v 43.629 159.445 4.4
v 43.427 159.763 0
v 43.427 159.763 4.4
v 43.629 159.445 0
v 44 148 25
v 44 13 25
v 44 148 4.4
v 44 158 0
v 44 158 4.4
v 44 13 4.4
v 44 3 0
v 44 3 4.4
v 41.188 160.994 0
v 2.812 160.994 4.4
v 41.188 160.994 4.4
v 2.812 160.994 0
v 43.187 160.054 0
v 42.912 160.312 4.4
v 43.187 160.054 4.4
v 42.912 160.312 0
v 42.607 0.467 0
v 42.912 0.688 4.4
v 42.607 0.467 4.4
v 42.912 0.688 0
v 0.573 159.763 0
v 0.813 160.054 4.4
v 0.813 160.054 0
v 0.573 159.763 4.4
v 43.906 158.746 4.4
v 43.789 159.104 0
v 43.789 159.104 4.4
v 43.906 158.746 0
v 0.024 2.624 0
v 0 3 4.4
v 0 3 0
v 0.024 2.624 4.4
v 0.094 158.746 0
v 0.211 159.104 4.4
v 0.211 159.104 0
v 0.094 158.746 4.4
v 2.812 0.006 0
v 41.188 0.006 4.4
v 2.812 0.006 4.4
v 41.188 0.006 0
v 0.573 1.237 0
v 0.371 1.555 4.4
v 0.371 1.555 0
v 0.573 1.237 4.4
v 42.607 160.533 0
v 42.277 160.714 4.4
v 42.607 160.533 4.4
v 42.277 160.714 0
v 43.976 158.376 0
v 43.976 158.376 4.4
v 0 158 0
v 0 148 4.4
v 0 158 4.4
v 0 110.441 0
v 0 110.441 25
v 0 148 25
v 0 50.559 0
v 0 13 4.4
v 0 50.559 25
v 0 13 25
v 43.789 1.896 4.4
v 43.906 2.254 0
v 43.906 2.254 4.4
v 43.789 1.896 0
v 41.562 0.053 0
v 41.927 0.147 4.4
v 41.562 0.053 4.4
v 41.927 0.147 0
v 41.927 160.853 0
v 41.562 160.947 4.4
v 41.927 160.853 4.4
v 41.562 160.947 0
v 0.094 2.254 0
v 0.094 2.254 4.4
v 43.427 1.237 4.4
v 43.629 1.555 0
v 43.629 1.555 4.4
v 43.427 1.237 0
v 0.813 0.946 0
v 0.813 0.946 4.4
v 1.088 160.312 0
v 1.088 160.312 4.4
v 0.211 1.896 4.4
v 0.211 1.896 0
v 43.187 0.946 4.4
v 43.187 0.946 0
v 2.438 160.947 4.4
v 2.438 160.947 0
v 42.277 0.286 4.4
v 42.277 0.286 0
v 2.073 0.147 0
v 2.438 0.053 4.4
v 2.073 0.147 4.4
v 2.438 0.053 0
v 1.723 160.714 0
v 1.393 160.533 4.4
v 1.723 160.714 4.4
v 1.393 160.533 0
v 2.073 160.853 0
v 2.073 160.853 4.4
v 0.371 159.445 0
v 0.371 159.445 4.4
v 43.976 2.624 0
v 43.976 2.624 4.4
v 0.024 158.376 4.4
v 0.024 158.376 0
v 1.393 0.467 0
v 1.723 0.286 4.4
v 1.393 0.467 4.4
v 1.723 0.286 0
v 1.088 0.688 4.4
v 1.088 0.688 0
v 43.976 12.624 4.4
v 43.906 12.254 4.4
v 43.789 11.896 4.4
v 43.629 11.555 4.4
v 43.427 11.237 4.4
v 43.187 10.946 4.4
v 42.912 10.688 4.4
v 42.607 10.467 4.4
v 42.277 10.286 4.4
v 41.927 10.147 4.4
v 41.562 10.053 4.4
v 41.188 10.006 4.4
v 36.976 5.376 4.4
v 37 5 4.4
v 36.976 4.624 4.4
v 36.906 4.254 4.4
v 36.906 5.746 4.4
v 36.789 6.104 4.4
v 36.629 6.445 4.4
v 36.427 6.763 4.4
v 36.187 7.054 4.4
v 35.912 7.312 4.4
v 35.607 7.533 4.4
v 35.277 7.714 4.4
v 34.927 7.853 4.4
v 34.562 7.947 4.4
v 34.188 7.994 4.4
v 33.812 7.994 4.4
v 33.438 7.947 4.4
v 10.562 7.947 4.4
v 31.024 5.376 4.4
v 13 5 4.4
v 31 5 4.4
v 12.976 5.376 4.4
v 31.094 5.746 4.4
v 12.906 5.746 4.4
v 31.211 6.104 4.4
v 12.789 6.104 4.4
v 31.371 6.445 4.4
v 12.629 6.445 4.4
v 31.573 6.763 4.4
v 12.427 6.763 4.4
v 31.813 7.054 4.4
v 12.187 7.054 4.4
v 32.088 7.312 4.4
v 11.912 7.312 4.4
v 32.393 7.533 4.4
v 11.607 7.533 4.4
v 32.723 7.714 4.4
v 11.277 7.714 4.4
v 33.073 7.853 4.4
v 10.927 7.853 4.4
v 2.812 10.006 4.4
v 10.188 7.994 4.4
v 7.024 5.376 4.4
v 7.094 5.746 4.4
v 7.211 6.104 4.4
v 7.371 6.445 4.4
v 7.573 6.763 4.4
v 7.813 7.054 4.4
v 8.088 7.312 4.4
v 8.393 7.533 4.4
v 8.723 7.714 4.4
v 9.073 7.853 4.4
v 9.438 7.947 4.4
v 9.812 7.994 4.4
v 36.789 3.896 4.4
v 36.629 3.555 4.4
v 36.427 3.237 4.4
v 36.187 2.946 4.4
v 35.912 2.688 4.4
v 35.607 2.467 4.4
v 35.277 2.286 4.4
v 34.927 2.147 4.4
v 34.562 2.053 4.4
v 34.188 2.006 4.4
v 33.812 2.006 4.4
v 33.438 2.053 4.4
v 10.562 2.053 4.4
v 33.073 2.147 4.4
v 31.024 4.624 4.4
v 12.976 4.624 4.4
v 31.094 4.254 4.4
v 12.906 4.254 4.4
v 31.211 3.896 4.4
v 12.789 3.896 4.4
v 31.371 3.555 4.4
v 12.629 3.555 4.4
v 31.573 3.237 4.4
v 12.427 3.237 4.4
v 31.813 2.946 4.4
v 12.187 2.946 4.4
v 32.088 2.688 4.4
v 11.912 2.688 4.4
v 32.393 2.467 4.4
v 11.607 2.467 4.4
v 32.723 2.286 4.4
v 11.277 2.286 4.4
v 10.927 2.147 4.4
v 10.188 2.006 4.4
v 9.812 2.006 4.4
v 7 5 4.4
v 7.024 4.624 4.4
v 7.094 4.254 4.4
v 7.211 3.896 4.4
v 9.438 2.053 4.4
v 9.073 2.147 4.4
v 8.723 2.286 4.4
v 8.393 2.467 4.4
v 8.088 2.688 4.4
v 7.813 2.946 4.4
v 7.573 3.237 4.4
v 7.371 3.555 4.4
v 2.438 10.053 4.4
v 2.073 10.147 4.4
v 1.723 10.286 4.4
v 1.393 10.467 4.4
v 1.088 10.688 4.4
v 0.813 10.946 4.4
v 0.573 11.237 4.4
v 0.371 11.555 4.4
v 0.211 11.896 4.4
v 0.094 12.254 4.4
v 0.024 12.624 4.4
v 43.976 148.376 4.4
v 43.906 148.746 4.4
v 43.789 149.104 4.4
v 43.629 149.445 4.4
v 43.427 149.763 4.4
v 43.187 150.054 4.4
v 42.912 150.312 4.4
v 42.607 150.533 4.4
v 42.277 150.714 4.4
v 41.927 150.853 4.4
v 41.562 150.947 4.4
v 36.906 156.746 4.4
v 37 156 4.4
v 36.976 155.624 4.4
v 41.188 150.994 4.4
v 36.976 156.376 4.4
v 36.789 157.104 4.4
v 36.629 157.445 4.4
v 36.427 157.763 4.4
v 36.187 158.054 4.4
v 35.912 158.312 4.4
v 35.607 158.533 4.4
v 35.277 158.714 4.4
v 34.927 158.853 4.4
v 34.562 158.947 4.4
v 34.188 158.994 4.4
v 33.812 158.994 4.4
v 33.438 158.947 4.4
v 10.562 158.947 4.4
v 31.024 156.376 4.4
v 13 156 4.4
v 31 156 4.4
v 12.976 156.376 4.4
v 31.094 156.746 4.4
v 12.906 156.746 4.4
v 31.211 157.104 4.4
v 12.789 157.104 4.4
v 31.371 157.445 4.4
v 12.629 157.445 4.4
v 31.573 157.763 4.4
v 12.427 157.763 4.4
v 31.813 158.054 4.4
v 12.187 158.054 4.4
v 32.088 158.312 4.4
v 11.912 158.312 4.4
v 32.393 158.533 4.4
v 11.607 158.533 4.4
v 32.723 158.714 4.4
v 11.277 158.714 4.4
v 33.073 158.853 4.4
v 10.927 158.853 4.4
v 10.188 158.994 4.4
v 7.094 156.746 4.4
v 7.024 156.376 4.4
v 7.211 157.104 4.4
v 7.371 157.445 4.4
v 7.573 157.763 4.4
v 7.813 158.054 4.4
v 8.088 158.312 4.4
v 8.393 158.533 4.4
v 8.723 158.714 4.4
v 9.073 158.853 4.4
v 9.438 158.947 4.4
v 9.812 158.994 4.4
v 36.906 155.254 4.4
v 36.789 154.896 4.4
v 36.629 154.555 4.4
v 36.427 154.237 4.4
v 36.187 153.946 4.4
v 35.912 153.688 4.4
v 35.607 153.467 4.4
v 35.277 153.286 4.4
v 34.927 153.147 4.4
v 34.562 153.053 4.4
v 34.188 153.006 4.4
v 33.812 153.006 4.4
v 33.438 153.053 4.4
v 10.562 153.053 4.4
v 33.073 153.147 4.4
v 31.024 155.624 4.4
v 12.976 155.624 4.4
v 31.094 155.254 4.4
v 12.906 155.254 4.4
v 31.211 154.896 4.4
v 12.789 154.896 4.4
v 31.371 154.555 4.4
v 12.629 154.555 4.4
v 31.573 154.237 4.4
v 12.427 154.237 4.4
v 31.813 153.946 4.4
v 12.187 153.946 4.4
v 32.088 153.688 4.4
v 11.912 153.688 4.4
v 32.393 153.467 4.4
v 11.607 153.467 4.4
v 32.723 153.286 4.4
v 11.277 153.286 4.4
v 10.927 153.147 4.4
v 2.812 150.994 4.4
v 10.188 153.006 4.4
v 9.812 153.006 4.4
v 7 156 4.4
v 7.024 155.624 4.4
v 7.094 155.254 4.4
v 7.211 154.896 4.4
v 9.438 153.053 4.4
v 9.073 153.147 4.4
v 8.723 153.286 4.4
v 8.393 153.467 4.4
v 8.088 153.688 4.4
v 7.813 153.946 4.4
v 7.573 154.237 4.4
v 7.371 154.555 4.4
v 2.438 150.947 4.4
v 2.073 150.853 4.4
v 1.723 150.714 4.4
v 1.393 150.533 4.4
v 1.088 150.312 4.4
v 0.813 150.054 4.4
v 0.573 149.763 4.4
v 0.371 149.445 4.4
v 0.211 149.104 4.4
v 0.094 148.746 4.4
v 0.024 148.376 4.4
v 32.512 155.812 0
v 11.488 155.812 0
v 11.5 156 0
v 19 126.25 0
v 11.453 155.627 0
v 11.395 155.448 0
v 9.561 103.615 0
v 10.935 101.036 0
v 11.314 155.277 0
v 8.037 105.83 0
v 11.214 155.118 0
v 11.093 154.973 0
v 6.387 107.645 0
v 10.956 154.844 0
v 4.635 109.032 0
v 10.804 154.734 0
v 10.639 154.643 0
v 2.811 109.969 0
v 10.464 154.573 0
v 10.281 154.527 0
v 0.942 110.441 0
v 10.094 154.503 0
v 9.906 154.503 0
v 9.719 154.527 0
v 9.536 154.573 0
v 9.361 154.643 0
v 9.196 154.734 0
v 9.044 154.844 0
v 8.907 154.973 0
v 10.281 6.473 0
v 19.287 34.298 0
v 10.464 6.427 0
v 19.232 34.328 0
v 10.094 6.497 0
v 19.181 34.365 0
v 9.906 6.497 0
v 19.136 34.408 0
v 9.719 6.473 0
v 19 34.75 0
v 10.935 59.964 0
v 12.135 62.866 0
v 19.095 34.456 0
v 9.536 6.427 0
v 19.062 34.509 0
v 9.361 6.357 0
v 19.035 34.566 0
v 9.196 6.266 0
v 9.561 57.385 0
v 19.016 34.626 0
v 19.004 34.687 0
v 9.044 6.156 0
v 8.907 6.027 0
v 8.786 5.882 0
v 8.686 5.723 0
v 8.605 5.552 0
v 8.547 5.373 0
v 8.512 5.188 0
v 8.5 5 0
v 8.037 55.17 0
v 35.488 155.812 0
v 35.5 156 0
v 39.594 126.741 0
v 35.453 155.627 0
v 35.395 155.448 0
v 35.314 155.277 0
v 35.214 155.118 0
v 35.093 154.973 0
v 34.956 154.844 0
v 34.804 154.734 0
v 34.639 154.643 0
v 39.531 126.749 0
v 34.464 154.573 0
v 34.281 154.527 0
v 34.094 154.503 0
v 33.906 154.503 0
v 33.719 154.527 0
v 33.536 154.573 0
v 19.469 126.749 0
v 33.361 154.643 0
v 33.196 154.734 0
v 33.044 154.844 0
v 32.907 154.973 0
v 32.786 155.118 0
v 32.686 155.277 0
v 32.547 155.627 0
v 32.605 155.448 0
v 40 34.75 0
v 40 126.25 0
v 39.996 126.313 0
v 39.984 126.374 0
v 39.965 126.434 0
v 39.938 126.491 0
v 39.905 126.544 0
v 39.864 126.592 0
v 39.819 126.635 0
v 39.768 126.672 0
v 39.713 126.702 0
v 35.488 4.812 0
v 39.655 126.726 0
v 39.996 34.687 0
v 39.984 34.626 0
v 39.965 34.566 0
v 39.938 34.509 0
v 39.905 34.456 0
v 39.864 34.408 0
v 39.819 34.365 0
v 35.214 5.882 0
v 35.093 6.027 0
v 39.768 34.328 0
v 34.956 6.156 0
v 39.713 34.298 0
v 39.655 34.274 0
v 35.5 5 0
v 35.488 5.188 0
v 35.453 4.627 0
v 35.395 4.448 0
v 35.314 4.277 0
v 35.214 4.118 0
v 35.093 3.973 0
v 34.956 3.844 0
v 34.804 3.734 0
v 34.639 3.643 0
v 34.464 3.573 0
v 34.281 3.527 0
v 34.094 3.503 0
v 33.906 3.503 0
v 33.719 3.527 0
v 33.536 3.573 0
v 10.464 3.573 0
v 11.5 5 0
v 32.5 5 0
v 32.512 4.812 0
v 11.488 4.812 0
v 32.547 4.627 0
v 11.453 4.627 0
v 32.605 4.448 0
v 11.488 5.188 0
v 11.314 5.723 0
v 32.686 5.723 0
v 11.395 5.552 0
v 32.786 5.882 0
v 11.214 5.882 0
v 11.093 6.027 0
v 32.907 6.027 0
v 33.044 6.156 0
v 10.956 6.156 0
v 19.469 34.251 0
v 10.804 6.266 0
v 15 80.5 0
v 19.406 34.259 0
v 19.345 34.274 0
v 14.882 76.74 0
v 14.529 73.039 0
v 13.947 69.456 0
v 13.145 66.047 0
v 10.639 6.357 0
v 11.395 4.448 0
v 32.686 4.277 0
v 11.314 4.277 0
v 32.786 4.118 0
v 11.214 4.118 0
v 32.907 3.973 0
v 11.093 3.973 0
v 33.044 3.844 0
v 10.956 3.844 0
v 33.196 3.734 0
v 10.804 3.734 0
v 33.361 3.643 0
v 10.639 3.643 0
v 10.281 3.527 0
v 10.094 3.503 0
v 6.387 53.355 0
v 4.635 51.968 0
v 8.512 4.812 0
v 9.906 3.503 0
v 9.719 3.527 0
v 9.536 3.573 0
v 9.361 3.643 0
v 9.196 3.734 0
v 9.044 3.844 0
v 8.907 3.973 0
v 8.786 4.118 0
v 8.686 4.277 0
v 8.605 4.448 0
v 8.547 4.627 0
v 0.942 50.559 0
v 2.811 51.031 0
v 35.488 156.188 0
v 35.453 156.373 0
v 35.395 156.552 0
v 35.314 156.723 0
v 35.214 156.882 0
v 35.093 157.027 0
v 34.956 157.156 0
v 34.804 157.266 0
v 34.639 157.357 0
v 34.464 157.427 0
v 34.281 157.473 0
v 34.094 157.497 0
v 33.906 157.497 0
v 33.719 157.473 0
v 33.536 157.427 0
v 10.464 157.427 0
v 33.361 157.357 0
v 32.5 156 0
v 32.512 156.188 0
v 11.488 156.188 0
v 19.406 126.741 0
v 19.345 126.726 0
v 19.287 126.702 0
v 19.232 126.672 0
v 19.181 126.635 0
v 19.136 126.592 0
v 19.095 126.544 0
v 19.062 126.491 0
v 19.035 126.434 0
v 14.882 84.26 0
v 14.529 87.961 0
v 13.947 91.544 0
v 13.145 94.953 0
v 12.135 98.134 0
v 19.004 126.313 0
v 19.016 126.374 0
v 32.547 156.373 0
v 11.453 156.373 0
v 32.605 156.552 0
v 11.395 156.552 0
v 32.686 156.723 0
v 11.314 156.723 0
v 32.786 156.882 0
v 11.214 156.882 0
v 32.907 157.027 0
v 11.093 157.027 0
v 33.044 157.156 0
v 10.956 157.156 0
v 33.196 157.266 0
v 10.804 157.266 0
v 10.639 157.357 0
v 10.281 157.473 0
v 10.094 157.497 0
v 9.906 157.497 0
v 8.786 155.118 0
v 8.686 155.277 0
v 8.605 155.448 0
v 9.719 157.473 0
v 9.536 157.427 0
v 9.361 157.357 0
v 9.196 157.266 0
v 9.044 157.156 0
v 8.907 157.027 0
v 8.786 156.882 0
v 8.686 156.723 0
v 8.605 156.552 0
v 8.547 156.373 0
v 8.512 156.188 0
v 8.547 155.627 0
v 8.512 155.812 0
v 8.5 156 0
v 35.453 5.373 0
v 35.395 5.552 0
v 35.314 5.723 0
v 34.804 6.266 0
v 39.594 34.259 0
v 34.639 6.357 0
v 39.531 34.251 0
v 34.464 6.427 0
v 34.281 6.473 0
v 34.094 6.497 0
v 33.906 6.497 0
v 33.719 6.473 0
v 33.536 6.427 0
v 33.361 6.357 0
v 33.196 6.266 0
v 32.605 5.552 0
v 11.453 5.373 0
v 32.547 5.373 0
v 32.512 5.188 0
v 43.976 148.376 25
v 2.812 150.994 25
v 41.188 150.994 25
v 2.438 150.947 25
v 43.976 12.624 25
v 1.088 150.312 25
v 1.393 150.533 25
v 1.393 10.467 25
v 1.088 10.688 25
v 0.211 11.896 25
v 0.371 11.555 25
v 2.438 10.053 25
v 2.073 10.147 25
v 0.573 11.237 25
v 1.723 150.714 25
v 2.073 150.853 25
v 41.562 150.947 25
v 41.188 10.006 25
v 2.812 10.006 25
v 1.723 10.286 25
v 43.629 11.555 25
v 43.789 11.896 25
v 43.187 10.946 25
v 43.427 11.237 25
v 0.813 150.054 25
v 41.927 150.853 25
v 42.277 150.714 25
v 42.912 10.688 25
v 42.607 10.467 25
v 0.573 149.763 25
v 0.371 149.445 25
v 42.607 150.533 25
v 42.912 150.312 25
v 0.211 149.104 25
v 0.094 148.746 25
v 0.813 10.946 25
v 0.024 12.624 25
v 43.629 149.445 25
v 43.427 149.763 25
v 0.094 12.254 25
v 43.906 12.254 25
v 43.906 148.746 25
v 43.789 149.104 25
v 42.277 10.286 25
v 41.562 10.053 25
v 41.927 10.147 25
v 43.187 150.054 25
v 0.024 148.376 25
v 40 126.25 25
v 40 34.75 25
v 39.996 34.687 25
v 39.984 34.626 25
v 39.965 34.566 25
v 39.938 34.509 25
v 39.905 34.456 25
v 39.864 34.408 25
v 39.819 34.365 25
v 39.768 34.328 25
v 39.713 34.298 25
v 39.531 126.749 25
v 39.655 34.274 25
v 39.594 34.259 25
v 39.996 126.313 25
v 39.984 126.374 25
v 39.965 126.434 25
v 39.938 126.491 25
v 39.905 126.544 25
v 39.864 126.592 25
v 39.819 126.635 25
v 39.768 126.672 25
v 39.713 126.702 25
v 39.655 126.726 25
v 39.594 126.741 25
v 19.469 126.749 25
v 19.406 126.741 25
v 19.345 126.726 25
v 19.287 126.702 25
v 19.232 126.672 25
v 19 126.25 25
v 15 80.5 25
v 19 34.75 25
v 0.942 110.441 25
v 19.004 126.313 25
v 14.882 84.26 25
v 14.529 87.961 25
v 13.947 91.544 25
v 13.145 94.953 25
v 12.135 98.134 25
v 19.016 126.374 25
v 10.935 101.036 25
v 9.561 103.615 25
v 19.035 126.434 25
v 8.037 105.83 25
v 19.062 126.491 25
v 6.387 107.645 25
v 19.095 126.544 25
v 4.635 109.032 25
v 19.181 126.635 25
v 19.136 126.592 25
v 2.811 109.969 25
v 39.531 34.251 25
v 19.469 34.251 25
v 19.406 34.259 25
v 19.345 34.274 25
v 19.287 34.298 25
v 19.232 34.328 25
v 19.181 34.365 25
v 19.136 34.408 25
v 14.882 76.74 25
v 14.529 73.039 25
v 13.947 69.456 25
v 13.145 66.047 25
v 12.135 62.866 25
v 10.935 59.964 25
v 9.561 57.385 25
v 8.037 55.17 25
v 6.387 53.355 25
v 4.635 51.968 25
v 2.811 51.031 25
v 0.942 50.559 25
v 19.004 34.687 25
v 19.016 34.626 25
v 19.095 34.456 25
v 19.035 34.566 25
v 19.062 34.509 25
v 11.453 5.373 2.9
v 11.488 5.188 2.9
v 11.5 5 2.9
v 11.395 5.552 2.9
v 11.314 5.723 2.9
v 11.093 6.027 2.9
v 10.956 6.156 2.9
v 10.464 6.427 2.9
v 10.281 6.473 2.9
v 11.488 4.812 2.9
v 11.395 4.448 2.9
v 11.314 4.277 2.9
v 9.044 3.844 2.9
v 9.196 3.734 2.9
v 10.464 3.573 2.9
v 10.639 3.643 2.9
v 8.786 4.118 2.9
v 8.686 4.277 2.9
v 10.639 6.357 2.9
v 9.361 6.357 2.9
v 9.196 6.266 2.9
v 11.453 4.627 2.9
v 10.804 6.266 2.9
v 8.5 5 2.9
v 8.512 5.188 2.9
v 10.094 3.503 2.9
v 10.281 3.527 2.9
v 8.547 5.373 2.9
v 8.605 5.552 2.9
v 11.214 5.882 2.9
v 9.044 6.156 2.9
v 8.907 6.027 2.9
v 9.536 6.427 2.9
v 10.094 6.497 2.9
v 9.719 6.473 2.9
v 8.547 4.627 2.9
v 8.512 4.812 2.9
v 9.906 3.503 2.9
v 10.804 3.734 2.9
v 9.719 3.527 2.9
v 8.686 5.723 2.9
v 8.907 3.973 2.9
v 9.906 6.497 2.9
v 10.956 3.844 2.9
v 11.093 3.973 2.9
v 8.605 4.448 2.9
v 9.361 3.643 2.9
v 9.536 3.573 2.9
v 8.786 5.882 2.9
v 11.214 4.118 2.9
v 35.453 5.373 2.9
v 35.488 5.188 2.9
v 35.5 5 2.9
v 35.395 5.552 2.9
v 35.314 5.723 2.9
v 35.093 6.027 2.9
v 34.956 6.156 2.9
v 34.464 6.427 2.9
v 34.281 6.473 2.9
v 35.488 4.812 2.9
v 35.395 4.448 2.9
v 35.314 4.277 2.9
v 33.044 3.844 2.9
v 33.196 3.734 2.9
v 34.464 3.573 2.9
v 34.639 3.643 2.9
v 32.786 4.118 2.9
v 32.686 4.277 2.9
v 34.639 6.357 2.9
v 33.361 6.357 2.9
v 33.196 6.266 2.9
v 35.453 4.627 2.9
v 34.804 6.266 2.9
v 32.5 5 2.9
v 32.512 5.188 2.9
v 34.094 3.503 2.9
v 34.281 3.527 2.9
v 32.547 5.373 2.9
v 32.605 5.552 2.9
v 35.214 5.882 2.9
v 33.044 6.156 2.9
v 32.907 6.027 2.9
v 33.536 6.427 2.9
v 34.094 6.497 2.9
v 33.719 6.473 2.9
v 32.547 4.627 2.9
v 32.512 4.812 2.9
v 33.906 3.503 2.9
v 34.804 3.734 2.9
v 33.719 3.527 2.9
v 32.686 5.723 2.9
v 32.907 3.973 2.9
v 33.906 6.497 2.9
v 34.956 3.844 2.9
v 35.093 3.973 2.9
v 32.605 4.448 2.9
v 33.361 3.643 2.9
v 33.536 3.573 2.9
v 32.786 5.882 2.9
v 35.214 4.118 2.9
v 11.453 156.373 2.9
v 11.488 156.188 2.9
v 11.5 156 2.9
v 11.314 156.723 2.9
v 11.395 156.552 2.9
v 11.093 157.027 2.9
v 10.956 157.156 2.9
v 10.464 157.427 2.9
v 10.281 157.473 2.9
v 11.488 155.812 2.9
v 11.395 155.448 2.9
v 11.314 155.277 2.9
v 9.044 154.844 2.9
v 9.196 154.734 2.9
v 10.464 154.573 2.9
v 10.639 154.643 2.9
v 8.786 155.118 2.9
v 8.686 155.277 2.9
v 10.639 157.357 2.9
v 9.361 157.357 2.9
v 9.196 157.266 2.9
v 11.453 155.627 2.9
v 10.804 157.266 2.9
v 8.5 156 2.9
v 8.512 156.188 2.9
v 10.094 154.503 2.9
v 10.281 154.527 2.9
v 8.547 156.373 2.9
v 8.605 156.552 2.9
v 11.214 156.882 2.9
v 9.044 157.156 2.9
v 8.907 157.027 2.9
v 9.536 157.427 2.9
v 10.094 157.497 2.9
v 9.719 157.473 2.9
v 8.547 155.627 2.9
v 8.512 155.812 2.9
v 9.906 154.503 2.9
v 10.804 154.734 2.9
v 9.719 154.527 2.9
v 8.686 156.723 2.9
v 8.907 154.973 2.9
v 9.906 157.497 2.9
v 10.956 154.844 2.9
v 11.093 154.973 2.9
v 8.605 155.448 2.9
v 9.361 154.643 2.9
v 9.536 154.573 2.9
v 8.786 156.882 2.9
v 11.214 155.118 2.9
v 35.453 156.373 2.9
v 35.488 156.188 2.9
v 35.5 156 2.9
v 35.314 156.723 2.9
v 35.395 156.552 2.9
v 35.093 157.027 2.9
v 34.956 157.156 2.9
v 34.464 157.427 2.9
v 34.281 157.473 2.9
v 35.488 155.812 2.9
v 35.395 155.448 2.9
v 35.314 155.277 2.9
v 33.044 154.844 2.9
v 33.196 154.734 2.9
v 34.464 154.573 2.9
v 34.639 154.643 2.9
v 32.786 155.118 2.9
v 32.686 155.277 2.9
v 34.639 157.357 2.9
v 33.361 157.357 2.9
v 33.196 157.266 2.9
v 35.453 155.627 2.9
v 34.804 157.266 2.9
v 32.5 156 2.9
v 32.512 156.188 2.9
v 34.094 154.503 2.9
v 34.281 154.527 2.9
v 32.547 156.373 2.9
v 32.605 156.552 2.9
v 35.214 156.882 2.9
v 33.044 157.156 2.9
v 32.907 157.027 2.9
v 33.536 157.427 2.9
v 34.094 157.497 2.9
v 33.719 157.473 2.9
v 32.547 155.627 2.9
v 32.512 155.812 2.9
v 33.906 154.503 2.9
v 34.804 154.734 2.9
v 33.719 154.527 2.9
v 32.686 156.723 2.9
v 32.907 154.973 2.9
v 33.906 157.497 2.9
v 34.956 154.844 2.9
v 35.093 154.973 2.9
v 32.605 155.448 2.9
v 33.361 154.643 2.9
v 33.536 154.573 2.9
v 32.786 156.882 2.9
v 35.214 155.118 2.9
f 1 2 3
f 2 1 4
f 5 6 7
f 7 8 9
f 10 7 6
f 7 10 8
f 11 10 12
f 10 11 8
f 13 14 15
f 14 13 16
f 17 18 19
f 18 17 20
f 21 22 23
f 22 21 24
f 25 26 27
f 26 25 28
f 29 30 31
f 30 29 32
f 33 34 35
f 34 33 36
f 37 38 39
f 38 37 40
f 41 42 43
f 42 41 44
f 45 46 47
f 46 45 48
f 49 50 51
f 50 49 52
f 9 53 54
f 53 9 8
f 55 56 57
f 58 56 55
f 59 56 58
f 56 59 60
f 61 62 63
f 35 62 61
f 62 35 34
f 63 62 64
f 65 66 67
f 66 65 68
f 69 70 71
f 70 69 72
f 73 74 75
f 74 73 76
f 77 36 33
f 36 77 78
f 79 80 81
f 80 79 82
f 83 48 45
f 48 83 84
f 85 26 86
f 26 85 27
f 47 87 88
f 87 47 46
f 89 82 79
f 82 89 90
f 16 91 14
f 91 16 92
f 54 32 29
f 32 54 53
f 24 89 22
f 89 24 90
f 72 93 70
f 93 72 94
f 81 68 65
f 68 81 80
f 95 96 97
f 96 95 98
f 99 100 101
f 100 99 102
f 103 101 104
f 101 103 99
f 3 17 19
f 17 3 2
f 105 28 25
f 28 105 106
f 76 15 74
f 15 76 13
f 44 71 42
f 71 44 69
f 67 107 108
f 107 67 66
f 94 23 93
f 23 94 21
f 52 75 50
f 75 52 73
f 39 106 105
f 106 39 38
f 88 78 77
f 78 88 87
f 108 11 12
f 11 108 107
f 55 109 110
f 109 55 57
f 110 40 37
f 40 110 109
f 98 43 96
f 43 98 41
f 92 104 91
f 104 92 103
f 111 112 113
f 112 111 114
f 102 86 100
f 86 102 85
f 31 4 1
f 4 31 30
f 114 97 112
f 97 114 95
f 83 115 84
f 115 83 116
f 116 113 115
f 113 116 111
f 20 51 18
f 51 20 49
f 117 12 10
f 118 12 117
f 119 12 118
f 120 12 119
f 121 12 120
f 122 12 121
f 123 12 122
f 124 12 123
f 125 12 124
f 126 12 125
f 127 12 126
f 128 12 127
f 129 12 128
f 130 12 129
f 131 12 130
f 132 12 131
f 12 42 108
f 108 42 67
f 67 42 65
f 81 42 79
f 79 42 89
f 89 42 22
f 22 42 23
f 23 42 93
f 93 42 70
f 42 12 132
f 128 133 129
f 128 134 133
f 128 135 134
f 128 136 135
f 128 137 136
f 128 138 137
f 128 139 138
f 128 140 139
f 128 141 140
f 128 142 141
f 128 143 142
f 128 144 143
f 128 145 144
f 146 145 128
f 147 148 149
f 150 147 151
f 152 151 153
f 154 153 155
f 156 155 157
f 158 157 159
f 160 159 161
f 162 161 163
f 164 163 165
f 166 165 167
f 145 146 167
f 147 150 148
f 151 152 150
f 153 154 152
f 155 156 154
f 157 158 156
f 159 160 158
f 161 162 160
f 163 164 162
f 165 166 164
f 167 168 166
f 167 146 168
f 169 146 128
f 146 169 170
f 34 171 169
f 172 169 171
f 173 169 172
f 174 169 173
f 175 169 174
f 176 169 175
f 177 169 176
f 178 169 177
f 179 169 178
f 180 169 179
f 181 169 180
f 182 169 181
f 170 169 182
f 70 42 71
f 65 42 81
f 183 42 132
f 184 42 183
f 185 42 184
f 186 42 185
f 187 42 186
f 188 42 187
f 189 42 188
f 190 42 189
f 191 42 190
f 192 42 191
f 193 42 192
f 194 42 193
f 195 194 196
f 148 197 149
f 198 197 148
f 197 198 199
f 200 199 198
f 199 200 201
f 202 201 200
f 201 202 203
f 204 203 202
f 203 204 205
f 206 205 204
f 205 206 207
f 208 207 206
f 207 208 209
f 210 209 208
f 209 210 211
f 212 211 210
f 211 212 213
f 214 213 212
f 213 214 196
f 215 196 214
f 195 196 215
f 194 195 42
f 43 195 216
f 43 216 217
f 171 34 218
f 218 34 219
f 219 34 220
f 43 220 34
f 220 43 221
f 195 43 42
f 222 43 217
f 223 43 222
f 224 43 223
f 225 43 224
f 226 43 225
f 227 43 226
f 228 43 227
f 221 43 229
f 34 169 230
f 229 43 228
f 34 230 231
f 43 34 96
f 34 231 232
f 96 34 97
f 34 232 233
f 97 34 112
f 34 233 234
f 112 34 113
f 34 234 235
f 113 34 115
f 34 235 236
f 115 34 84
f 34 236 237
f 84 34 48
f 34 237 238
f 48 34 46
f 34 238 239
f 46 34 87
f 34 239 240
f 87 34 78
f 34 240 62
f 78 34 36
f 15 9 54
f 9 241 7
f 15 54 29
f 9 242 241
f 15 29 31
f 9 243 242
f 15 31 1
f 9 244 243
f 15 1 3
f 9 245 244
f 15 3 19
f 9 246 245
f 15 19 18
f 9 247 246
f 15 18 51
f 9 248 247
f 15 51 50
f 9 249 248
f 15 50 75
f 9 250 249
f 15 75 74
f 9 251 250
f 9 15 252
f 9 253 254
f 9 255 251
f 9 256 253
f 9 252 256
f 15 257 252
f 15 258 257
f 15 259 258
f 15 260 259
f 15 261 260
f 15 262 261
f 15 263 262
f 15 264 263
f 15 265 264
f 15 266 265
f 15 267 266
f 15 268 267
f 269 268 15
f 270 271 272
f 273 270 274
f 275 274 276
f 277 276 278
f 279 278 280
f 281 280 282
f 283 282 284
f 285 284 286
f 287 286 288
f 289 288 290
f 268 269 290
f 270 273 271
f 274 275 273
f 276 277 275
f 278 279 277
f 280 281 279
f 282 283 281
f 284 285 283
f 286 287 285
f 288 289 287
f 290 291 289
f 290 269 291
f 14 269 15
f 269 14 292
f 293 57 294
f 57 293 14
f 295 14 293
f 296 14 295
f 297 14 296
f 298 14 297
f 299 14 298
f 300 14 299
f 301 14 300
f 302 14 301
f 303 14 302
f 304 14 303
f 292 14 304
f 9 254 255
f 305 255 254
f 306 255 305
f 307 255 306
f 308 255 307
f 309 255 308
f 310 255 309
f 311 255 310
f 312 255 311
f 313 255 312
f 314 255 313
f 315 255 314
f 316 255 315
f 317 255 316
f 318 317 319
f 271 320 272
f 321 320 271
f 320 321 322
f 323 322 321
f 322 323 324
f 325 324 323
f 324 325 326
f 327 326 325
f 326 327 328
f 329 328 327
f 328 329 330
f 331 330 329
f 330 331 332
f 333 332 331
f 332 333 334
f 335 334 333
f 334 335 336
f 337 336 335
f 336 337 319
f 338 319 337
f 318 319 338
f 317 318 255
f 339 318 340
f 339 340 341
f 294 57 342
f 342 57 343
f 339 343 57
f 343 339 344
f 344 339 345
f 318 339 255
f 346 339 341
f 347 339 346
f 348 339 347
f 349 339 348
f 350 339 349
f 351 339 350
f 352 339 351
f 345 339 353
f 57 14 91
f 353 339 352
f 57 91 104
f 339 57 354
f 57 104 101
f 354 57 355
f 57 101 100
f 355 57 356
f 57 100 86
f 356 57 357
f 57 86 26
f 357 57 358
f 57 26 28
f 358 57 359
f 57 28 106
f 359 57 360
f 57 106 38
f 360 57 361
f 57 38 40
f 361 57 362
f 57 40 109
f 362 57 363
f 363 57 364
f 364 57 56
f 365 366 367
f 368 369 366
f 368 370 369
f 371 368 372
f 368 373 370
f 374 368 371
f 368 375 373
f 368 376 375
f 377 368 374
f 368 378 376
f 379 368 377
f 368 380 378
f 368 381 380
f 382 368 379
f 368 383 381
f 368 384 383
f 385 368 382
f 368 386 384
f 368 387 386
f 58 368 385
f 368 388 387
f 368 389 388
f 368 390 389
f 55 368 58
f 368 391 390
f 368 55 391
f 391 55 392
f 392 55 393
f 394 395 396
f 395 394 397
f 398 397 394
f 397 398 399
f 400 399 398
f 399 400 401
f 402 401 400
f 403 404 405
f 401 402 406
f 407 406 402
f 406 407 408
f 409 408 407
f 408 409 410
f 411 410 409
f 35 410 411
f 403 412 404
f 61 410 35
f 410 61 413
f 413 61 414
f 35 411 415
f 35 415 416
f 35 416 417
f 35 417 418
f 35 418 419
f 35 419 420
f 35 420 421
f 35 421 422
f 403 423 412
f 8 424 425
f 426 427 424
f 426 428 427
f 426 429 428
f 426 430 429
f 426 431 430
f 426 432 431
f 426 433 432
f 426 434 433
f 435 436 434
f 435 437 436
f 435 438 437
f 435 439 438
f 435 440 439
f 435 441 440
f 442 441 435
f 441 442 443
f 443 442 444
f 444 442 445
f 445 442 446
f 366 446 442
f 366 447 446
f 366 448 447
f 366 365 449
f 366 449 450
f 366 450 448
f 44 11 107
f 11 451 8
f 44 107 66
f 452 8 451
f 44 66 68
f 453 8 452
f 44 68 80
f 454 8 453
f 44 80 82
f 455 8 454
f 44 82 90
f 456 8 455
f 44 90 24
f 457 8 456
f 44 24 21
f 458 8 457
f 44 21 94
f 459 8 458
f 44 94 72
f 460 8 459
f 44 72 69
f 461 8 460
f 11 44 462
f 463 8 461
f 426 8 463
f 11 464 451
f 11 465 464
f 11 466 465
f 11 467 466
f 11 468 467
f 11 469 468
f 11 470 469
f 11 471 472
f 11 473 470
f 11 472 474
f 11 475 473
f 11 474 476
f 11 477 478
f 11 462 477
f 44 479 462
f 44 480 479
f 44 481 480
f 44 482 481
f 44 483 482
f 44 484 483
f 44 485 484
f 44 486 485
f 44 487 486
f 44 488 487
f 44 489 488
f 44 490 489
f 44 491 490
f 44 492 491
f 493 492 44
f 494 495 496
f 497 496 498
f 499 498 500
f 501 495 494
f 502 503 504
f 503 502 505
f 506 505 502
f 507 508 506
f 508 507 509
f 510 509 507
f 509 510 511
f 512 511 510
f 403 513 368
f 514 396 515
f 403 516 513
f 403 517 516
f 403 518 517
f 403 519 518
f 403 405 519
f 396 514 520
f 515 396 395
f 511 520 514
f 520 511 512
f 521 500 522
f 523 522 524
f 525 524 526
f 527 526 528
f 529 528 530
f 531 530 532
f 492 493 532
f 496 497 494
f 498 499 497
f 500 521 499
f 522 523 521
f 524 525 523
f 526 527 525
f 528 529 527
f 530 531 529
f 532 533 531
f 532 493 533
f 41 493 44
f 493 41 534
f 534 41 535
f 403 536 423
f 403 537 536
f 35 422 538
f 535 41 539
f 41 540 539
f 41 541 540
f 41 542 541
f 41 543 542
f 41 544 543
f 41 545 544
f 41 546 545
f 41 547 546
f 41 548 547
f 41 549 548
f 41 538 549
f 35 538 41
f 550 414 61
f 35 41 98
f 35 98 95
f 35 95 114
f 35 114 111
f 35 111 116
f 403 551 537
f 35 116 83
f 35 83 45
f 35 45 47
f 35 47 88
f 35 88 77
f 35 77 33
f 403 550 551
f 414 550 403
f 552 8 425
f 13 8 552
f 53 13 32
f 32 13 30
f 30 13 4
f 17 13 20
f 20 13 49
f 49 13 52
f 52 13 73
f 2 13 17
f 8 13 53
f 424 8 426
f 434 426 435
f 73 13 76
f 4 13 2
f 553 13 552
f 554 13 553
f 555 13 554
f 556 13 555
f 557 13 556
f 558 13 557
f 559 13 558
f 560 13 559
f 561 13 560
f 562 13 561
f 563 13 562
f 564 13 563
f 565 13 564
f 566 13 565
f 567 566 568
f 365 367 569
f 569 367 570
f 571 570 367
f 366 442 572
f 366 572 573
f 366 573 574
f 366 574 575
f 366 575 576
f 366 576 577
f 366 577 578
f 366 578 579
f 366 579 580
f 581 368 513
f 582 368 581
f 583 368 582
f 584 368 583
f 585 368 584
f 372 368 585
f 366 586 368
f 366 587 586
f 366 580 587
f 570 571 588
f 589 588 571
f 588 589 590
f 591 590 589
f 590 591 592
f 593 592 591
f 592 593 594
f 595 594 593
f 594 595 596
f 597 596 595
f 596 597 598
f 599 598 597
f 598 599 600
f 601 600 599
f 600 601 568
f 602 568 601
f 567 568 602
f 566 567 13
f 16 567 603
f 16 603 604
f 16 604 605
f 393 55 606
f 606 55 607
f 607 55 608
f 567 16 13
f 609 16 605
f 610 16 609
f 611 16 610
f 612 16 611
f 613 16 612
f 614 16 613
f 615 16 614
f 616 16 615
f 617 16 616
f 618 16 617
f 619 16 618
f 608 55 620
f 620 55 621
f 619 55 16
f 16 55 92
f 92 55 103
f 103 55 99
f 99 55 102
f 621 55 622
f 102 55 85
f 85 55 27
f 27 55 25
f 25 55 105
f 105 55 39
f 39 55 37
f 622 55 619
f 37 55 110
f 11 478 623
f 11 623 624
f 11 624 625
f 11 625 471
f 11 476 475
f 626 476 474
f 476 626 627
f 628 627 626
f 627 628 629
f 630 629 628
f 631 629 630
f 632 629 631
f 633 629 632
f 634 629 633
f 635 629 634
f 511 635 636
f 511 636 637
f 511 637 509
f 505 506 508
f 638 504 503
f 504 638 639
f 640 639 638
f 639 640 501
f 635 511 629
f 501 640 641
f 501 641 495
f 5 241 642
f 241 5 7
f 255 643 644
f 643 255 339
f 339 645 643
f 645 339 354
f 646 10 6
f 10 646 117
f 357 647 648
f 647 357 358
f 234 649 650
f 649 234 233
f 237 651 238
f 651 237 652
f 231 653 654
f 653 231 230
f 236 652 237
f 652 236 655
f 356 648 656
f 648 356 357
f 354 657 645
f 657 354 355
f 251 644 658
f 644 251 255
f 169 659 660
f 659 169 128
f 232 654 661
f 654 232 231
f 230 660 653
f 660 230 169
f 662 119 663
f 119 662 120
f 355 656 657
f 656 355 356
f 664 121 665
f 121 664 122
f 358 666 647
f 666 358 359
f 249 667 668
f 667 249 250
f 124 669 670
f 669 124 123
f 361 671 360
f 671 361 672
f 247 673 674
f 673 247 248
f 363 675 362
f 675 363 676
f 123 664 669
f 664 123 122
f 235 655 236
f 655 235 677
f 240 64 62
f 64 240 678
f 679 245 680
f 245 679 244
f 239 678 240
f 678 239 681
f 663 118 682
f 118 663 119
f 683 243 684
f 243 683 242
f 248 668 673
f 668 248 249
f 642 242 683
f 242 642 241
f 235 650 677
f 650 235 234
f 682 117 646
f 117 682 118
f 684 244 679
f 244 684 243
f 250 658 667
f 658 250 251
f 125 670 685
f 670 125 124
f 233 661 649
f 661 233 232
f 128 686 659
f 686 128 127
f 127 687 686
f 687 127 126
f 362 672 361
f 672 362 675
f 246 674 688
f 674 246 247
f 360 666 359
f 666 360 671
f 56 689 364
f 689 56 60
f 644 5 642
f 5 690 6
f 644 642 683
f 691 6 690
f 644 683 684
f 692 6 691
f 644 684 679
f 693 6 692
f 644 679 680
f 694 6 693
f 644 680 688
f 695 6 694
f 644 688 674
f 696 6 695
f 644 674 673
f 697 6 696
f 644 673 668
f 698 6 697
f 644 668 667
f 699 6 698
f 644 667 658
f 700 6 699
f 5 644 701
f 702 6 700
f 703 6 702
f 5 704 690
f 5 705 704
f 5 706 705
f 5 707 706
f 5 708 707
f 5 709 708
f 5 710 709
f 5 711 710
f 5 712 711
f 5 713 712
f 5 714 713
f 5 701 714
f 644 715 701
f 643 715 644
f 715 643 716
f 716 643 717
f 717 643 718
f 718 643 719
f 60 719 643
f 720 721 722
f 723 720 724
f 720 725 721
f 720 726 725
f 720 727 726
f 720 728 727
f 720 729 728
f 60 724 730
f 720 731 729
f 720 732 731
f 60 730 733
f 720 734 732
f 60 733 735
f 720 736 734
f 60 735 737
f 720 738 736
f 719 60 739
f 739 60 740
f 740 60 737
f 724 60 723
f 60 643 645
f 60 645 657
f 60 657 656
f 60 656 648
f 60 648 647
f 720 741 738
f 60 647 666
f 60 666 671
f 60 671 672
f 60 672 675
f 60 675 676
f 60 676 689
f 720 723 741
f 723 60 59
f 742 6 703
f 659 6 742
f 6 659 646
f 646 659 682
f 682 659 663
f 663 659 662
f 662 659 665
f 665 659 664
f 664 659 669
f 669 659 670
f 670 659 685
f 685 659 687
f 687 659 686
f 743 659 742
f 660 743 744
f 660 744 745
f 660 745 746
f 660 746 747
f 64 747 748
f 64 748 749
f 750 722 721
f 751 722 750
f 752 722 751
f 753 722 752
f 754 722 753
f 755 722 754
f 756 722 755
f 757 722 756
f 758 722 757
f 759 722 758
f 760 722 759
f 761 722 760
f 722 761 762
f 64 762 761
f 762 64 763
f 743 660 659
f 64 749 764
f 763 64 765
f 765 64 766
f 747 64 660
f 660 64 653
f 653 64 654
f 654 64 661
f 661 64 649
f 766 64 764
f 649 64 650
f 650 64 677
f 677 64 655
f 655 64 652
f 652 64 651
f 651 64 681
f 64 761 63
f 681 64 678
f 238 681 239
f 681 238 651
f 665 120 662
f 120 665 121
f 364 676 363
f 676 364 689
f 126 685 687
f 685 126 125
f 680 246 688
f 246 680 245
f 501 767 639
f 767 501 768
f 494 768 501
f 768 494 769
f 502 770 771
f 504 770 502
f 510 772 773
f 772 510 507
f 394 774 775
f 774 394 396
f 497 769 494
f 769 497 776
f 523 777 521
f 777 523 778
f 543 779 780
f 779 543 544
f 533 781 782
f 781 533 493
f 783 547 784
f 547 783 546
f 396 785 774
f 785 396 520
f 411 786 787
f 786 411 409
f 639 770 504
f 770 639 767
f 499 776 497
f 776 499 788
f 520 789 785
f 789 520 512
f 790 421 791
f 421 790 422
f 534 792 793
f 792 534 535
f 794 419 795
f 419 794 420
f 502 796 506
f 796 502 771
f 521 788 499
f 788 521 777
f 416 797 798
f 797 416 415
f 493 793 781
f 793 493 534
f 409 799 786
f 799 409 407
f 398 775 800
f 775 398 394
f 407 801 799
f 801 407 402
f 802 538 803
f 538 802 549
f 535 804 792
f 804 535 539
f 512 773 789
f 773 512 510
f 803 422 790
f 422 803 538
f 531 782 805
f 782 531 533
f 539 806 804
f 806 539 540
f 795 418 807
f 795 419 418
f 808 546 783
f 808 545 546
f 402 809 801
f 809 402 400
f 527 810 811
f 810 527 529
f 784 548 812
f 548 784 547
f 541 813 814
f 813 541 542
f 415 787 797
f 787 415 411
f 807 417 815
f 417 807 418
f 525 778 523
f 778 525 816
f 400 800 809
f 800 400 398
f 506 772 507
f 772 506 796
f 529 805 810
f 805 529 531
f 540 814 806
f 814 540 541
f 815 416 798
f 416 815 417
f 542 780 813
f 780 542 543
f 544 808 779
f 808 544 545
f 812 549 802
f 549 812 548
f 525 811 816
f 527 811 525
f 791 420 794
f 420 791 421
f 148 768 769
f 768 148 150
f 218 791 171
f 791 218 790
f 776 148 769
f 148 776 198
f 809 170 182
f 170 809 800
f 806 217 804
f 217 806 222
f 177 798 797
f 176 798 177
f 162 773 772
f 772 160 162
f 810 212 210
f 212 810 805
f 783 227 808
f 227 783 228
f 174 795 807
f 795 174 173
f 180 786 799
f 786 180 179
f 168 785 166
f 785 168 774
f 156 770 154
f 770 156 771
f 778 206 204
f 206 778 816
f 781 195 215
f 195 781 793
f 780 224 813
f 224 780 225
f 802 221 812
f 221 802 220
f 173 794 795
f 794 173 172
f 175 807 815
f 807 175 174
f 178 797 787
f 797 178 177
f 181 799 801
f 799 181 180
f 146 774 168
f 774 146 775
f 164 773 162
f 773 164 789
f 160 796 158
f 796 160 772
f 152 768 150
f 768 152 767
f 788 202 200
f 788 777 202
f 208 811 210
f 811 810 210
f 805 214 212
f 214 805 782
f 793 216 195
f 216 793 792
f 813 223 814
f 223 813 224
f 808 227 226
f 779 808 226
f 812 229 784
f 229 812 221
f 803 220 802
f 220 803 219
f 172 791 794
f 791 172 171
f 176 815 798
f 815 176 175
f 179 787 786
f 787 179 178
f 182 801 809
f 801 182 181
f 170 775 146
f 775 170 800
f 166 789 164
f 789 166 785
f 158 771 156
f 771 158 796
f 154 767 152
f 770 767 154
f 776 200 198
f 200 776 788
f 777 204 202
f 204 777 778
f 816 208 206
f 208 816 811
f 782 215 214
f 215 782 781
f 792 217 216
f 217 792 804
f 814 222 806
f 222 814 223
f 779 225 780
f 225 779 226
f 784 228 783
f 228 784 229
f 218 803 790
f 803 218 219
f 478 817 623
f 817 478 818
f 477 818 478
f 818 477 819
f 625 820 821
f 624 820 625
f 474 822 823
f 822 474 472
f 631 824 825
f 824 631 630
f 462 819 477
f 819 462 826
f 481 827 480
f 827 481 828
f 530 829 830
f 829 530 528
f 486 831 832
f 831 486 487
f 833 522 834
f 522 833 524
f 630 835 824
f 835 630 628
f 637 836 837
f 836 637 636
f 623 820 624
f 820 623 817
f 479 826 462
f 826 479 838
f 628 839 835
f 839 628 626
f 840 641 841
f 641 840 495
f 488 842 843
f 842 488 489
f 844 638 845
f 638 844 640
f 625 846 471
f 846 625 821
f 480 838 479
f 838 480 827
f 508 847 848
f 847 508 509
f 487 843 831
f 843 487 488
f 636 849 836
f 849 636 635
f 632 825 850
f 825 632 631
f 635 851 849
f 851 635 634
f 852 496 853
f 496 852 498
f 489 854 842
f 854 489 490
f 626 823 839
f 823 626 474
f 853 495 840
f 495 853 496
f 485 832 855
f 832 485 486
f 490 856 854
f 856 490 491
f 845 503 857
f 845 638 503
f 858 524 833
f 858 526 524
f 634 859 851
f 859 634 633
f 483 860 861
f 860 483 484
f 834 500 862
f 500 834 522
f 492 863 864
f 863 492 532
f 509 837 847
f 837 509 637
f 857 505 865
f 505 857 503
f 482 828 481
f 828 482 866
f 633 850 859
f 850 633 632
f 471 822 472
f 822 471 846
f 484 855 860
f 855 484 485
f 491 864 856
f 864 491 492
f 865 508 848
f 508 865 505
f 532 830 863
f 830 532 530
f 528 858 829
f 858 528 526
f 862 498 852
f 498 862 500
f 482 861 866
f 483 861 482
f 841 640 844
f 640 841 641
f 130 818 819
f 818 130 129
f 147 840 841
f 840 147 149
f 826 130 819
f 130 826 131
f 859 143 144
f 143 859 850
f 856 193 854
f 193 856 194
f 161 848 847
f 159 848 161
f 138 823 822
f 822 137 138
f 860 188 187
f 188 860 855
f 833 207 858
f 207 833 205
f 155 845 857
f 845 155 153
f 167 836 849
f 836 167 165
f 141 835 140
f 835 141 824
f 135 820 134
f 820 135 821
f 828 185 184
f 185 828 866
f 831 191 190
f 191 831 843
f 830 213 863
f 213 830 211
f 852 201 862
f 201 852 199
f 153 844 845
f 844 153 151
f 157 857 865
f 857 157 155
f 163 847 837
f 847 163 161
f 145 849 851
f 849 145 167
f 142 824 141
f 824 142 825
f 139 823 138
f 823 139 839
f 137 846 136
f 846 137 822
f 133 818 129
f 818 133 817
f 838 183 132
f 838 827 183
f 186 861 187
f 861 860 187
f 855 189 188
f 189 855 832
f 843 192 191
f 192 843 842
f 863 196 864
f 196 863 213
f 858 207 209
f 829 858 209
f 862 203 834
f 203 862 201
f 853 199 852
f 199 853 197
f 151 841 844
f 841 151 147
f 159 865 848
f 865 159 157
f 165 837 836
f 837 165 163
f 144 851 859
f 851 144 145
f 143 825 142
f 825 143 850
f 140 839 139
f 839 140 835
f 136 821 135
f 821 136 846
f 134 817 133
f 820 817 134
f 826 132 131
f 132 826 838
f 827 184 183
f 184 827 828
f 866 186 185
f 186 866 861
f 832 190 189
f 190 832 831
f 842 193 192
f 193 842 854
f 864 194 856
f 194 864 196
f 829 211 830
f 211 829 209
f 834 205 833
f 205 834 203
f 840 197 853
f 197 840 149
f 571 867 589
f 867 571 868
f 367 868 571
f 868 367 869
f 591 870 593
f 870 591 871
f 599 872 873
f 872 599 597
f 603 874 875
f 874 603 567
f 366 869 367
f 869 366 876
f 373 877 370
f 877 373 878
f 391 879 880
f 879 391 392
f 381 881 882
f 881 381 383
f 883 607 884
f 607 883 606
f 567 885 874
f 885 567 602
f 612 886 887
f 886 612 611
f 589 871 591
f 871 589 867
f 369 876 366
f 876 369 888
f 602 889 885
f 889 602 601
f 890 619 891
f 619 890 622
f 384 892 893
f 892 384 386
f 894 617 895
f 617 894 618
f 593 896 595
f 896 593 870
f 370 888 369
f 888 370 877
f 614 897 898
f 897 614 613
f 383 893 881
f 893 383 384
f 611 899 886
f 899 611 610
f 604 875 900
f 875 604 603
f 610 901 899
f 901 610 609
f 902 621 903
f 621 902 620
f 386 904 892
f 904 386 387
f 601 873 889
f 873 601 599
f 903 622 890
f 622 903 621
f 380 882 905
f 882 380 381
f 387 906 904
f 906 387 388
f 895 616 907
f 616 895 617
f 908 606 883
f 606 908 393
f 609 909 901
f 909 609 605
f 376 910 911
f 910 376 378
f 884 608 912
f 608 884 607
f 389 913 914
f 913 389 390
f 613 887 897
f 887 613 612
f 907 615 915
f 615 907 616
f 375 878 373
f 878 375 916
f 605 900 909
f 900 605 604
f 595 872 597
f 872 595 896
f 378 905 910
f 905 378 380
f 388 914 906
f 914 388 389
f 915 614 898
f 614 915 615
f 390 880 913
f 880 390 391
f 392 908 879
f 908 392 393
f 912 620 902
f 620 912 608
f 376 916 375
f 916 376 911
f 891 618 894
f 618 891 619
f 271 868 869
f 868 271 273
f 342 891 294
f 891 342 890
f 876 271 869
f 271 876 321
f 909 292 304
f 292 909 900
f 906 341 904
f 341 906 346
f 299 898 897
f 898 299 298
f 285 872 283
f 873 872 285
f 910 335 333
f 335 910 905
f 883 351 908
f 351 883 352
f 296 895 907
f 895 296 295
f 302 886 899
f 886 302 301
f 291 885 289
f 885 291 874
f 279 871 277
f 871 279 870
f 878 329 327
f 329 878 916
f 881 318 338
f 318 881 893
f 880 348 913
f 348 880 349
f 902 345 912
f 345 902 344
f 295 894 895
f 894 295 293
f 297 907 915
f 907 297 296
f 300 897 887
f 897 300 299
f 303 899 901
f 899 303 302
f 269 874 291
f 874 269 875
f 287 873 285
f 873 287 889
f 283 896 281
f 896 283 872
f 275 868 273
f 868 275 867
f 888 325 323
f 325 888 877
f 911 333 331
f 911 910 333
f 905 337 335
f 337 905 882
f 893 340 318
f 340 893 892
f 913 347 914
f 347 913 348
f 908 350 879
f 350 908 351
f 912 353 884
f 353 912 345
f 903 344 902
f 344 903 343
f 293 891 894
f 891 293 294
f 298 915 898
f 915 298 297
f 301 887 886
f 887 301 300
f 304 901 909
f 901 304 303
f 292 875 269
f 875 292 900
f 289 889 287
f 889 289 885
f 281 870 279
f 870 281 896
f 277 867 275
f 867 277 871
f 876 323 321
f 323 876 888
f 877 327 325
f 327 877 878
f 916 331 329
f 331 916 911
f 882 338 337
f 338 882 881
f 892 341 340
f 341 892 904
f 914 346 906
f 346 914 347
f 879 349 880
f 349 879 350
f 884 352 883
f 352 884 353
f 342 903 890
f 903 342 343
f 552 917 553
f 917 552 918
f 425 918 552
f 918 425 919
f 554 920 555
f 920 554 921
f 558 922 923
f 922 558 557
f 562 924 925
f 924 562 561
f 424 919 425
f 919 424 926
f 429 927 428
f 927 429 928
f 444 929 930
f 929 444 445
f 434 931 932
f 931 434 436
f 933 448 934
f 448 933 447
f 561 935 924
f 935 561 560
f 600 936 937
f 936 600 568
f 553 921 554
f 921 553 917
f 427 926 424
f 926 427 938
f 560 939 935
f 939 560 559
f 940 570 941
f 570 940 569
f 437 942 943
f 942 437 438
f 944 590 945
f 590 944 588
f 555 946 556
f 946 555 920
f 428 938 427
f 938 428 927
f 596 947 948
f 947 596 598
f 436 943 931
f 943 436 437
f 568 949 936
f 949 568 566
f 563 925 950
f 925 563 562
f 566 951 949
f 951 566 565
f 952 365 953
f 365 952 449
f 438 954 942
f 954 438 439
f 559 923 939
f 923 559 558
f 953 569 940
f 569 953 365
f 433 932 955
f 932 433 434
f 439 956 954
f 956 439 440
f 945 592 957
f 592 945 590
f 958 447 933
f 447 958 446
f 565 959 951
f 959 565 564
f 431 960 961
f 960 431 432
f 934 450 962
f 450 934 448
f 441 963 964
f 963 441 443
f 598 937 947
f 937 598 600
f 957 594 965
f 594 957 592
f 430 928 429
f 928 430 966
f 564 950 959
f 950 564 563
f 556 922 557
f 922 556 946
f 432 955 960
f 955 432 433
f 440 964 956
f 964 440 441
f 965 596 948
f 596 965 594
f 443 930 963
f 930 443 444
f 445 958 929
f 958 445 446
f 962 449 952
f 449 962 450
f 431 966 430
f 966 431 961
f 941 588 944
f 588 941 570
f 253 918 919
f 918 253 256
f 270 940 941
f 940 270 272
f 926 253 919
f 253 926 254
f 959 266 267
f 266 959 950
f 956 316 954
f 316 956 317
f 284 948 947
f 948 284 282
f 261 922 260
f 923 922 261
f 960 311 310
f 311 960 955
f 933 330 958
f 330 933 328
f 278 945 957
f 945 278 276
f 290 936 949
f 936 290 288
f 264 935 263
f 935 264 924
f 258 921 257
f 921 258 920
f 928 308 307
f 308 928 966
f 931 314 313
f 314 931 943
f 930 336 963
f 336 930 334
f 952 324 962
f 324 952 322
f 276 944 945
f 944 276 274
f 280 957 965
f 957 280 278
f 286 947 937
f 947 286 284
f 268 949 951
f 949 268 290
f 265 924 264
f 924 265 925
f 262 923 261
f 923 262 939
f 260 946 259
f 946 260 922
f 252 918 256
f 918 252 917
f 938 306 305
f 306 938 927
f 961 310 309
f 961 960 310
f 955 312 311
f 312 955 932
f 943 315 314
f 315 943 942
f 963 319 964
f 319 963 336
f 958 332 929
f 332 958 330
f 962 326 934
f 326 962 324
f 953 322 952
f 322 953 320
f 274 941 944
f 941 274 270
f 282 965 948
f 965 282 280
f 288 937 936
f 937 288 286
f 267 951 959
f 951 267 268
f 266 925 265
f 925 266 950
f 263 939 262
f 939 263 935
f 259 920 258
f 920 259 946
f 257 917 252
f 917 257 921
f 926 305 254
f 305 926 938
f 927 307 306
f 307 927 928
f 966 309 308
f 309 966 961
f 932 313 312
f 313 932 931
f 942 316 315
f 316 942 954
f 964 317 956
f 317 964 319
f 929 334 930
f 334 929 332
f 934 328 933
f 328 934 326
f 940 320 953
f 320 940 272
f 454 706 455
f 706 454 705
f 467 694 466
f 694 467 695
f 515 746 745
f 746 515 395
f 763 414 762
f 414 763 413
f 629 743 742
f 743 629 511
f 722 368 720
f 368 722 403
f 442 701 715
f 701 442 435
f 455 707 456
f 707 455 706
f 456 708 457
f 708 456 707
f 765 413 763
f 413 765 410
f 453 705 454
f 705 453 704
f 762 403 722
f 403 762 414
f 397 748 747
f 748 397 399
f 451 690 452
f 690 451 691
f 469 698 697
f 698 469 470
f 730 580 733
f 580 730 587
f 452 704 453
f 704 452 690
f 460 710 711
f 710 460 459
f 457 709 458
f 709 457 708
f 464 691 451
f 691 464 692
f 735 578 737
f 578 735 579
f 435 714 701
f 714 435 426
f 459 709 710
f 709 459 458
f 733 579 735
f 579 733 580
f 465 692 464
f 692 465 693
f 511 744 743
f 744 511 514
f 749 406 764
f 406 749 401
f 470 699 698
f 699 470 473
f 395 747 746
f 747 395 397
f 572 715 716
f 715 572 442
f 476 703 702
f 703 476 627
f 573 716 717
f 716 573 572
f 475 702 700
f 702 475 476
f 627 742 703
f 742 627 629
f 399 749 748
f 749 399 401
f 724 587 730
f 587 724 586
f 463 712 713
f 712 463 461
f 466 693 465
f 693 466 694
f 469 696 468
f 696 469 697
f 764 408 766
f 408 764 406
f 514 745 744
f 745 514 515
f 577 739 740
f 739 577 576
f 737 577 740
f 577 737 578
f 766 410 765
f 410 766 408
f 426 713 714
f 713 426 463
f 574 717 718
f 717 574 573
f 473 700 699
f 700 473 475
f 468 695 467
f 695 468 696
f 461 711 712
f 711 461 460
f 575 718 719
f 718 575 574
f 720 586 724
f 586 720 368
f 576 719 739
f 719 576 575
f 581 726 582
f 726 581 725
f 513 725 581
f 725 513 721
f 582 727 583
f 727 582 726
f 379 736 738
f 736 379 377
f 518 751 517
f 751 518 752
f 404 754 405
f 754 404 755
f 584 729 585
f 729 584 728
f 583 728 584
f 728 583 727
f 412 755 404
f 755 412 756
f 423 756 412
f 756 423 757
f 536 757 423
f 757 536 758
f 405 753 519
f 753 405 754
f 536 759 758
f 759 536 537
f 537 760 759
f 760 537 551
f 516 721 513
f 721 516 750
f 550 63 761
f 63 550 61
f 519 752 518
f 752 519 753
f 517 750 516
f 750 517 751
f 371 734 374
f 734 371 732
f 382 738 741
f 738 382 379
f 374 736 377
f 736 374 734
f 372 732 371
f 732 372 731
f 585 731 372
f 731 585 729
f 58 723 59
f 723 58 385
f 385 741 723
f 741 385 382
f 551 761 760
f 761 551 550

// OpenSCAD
$fn=50;

x=282;
y=210;
zb=4.4;
z=25;

module senkloch() {
    h=4.4;
    r=6/2;
    union() {
        cylinder(h=h, r = r/2);
        translate([0,0,h-r]) cylinder(h=r, r1=0, r2=r);
        translate([0,0,h]) cylinder(h=h, r = r);
    }
}
module cube_rounded(v, r=3, center=false){
    translate([r,r,0])
    minkowski(){
        cube([v[0]-(2*r), v[1]-(2*r), v[2]-r], center);
        cylinder(r,r,r);
    }
}
module spirits() {
    difference() {
        union() {
            cube_rounded(v = [x/3,y,zb]);
            translate(v = [0,10,0]) cube_rounded(v = [x/3,y-2*10,z]);
        }
        translate(v = [10,5,0]) senkloch();
        translate(v = [x/3-10,5,0]) senkloch();
        translate(v = [10,y-5,0]) senkloch();
        translate(v = [x/3-10,y-5,0]) senkloch();
        for (i=[0:16]) {
            translate(v = [1.8,10+5+10*i,0]) rotate([0,0,10]) cube_rounded(v = [92.5,5,30],r=0.5);
        }
    }
}
// spirits();


module panels() {
    xp=230;
    yp=153;
    w=4;
    difference() {
        cube_rounded(v = [xp+2*w,yp+2*w,z], r=w+5);
        translate(v = [w,w,zb]) cube_rounded(v = [xp,yp,z], r=5);
        translate(v = [10,10,0]) senkloch();
        translate(v = [xp+2*w-10,10,0]) senkloch();
        translate(v = [10,yp+2*w-10,0]) senkloch();
        translate(v = [xp+2*w-10,yp+2*w-10,0]) senkloch();
        translate(v = [xp/2+w,0,0]) cylinder(h=30, r=60);
        translate(v = [xp/2+w,yp+2*w,0]) cylinder(h=30, r=60);
        translate(v = [0,yp/2+w,0]) cylinder(h=30, r=30);
        translate(v = [xp+2*w,yp/2+w,0]) cylinder(h=30, r=30);
    }
}
// panels();

module aspects() {
    ya=153+2*4;
    xa=x-(230+2*4);
    w=4;
    difference() {
        union() {
            cube_rounded(v = [xa,ya,zb]);
            translate(v = [0,10,0]) cube_rounded(v = [xa,ya-2*10,z]);
        }
        translate(v = [10,5,0]) senkloch();
        translate(v = [xa-10,5,0]) senkloch();
        translate(v = [10,ya-5,0]) senkloch();
        translate(v = [xa-10,ya-5,0]) senkloch();
        // intersection() {
        //     translate(v = [w,10+w,0]) cube(size = [xa-2*w,ya-2*w-2*10,30]);
        //     translate(v = [0,7,0]) rotate([0,0,acos((xa-2*w)/94.7)]) cube(size = [200,20,30]);
        // }
        xac = 21;
        translate(v = [xa-xac-w,(ya-92.5)/2,0]) cube_rounded(v=[xac,92.5,30],r=0.5);
        translate(v = [0,ya/2,0]) scale(v = [1,2,1]) cylinder(h=30, r=15);
    }
}
aspects();
